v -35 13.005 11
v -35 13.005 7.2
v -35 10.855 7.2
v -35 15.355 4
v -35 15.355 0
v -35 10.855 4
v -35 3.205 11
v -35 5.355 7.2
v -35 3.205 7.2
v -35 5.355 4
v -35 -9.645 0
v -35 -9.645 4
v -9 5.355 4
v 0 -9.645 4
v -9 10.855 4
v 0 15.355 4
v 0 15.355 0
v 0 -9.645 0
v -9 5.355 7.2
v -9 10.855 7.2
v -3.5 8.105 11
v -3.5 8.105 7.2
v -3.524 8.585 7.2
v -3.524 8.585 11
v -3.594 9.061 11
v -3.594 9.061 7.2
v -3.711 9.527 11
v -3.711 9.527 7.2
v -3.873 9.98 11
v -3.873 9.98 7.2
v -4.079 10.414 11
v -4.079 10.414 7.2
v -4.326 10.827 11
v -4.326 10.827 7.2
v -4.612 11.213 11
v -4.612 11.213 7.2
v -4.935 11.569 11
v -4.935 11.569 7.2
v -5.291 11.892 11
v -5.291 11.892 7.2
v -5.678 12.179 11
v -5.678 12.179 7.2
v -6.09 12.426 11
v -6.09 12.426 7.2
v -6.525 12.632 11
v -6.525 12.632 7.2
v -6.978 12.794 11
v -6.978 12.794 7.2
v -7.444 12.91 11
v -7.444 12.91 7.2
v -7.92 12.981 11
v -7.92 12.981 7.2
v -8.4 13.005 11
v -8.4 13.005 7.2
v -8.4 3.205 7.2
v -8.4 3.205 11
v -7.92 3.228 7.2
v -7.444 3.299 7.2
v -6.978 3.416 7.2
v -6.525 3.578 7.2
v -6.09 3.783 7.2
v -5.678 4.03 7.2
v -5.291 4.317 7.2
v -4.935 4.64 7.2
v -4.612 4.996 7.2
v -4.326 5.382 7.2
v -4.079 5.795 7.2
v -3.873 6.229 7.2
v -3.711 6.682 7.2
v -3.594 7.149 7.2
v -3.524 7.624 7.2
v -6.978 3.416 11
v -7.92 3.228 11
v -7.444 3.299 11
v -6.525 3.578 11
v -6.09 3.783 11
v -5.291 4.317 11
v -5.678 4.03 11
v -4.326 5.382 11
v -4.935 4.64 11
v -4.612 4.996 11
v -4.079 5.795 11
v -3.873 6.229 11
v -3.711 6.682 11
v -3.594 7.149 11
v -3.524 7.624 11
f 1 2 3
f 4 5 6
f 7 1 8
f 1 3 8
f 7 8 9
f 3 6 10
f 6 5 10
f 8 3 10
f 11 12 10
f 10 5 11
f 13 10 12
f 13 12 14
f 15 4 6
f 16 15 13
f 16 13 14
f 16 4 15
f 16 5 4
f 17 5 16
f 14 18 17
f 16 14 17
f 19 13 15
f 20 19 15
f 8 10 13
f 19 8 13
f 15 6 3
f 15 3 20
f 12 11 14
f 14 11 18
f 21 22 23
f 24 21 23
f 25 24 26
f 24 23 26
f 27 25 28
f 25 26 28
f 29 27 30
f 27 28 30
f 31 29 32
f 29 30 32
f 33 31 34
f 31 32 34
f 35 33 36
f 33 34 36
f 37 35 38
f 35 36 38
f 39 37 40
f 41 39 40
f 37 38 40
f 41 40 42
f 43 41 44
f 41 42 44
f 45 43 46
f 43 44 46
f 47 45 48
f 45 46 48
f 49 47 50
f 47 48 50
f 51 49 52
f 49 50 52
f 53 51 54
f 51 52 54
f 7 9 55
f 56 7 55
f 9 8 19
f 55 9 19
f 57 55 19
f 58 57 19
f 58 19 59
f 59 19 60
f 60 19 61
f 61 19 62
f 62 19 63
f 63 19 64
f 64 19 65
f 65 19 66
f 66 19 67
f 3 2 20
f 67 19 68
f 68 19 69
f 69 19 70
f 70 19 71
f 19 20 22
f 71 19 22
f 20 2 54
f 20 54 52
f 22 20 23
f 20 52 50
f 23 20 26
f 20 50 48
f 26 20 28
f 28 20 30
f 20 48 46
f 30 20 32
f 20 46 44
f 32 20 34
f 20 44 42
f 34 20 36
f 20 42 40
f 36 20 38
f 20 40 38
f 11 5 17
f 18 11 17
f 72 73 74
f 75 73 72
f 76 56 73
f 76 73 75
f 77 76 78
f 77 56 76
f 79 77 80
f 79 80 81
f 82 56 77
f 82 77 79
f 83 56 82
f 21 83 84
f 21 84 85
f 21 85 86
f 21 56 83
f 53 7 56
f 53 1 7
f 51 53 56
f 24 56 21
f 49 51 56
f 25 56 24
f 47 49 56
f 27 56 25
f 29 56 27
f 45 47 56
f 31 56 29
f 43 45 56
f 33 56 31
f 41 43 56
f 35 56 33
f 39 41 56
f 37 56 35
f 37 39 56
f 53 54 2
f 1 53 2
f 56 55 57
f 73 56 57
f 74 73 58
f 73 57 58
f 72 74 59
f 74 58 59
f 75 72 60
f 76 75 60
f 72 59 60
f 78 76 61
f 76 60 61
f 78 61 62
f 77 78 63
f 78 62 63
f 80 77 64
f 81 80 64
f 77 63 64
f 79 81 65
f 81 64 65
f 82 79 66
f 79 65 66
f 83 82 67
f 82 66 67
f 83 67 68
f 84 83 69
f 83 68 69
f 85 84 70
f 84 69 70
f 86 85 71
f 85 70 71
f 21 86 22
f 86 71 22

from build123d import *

# Parameters (mm, degrees)
F0_W     = 35
F0_H     = 25
F1_DEPTH = 4
F2_W     = 26
F2_H     = 5.5
F3_DEPTH = 3.2
F4_W     = 26
F4_H     = 5.5
F5_DEPTH = 3.8


with BuildPart() as f1:
    # F0 (on Top) → F1 (new body)
    with BuildSketch(Plane.XY):
        with Locations((-17.5, 2.854638)):
            Rectangle(F0_W, F0_H)
    extrude(amount=F1_DEPTH)

    # F2 (on face) → F3 (join)
    with BuildSketch(Plane.XY.offset(4)):
        with Locations((-22, 8.104638)):
            Rectangle(F2_W, F2_H)
    extrude(amount=F3_DEPTH)

    # F4 (on face) → F5 (join)
    with BuildSketch(Plane.XY.offset(7.2)):
        with BuildLine():
            Line((-35, 5.354638), (-35, 3.204638))
            Line((-35, 3.204638), (-8.4, 3.204638))
            ThreePointArc((-8.4, 3.204638), (-4.935177, 4.639814), (-3.5, 8.104638))
            ThreePointArc((-3.5, 8.104638), (-4.935177, 11.569461), (-8.4, 13.004638))
            Line((-8.4, 13.004638), (-35, 13.004638))
            Line((-35, 13.004638), (-35, 10.854638))
            Line((-35, 10.854638), (-9, 10.854638))
            Line((-9, 10.854638), (-9, 5.354638))
            Line((-9, 5.354638), (-35, 5.354638))
        make_face()
        with Locations((-22, 8.104638)):
            Rectangle(F4_W, F4_H)
    extrude(amount=F5_DEPTH)


solid = f1.part
